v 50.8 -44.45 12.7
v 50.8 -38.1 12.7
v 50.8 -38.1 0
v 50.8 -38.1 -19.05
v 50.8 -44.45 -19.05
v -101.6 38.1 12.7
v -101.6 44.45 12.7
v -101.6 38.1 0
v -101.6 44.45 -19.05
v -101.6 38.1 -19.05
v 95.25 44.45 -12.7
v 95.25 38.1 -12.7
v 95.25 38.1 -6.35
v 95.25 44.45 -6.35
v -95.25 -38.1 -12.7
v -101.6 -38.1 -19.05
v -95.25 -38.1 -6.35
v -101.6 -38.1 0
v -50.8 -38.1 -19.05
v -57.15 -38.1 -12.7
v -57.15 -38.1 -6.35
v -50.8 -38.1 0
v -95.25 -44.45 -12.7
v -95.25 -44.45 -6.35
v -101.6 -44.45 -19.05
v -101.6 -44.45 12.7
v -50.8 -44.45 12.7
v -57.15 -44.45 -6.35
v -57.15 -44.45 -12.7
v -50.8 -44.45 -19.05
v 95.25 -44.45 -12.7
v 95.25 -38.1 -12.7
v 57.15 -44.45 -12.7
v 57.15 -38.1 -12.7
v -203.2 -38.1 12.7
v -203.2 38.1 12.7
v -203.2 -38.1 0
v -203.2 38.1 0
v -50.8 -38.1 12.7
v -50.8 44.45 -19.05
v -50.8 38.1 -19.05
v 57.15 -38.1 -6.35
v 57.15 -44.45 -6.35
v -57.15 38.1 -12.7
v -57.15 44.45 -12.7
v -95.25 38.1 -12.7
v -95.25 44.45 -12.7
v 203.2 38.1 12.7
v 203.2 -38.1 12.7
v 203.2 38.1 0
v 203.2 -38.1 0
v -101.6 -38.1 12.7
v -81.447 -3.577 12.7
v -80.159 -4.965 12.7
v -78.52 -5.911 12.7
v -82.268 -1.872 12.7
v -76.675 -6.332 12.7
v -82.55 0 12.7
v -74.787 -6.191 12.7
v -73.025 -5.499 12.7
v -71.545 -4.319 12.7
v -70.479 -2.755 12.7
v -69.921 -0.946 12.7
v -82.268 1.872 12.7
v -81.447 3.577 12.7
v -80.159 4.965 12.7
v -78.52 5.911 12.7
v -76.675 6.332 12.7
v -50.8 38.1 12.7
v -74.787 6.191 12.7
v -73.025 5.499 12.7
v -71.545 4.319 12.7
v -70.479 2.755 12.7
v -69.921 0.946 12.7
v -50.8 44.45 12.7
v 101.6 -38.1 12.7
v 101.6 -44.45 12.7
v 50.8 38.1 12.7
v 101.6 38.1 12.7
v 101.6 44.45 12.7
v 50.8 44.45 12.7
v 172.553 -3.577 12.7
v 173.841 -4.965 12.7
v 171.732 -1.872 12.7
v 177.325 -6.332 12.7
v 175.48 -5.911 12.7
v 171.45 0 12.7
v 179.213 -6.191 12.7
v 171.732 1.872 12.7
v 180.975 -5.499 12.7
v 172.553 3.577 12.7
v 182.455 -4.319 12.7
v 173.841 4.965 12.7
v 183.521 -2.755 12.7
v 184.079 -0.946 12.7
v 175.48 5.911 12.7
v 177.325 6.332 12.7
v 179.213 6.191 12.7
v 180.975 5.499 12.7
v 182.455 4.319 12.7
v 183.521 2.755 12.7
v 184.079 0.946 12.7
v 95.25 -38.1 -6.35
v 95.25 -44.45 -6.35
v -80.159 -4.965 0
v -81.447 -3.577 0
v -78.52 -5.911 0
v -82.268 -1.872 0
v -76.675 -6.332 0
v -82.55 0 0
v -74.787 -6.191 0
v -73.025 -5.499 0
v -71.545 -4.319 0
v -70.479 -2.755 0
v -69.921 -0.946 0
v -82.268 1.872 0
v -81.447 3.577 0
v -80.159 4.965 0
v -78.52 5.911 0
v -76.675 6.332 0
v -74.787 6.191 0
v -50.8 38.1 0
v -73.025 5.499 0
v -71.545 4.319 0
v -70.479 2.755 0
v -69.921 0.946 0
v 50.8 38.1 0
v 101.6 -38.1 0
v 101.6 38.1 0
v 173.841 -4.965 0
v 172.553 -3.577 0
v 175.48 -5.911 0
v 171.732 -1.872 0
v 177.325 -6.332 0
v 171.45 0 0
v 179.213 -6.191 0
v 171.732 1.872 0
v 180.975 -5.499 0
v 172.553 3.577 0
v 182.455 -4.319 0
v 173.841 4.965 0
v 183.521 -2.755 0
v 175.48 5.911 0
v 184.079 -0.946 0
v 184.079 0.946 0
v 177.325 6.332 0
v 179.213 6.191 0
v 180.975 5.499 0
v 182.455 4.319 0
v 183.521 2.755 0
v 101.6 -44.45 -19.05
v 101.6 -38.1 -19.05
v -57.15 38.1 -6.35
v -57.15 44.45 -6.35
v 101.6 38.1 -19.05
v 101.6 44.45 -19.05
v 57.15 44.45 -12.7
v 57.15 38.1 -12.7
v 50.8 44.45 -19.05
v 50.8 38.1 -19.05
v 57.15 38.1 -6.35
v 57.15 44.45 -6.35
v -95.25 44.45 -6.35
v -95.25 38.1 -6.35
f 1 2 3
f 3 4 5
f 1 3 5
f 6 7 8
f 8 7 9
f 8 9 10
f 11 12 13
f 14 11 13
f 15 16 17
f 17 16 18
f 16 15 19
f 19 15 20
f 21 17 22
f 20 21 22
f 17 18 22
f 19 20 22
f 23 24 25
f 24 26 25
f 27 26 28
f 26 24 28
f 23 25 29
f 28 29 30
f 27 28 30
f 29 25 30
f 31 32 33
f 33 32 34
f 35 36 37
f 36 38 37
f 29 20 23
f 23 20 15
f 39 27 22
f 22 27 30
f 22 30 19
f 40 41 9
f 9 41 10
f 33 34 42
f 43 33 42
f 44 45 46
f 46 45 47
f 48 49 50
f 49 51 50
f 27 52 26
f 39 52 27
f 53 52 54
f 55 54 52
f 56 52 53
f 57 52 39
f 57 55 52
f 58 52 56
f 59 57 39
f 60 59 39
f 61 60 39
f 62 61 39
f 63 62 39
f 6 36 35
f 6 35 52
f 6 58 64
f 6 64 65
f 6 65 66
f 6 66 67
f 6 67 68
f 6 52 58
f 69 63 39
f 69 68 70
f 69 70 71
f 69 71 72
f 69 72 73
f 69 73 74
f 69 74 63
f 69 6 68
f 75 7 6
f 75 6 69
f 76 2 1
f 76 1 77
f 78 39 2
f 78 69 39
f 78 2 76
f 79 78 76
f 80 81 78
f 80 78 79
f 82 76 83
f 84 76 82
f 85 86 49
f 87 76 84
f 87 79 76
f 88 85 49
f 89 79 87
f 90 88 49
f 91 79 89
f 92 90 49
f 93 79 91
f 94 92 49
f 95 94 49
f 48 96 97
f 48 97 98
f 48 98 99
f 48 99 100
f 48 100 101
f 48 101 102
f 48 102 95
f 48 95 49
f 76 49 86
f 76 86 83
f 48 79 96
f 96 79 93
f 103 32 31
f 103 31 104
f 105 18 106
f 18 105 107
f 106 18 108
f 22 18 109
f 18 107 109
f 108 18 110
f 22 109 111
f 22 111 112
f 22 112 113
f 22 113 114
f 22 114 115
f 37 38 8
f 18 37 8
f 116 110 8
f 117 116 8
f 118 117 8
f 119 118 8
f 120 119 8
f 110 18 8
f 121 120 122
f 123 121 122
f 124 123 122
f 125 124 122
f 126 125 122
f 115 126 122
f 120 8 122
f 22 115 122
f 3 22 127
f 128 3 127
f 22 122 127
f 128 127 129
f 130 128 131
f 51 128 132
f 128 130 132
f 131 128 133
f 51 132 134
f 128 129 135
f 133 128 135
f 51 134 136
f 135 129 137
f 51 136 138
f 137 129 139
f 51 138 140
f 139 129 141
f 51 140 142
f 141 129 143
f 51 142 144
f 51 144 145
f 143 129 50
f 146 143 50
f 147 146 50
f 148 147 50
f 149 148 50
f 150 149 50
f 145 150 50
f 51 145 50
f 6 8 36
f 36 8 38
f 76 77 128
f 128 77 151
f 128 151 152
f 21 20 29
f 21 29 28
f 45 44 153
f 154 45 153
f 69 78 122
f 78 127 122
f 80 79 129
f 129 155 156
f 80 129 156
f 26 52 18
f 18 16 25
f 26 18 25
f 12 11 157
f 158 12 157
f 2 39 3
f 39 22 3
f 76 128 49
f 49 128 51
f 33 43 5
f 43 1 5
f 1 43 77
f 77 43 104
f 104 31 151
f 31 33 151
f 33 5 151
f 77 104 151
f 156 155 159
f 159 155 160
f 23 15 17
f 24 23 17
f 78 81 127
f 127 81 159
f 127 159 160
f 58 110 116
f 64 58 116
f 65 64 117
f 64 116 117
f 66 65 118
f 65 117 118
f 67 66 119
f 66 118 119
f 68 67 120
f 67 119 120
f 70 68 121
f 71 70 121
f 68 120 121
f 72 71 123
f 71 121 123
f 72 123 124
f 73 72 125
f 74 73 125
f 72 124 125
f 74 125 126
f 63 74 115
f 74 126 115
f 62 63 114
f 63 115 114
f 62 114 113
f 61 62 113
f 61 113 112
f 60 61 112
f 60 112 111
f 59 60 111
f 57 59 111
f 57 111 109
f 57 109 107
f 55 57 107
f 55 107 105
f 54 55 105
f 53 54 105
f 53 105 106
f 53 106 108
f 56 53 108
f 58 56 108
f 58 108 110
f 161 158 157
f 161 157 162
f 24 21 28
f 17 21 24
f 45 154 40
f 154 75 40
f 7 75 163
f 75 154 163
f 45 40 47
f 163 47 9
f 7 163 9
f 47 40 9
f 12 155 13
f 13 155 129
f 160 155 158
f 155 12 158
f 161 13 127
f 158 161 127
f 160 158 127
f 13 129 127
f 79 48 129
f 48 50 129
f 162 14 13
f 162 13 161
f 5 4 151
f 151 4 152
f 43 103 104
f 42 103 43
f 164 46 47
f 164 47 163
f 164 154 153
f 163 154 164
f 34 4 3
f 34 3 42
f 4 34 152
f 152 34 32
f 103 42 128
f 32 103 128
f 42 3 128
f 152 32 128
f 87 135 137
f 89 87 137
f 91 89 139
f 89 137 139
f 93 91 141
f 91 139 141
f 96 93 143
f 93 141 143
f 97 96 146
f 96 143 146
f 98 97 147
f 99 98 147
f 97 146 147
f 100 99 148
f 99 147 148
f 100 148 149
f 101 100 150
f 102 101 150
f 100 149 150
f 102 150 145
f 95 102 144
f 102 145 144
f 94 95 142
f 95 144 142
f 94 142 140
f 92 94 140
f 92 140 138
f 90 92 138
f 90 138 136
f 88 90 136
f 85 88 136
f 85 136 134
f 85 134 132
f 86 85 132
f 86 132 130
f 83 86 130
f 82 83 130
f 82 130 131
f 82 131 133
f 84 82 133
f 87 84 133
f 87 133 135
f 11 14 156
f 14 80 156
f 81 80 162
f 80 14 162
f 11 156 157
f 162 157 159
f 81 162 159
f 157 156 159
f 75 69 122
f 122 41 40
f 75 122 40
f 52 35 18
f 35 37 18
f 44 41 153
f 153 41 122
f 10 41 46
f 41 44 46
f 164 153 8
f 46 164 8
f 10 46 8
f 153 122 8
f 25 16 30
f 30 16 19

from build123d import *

# Parameters (mm, degrees)
F0_W      = 406.4
F0_H      = 76.2
F1_DEPTH  = 6.35
F2_W      = 50.8
F2_H      = 25.4
F3_DEPTH  = 6.35
F4_W      = 50.8
F4_H      = 25.4
F5_DEPTH  = 6.35
F7_W      = 38.1
F7_H      = 6.35
F6_W      = 38.1
F6_H      = 6.35
F8_DEPTH  = 88.901
F10_DEPTH = 6.35
F12_D     = 12.7


with BuildPart() as f1:
    # F0 (on Top) → F1 (new body)
    with BuildSketch(Plane.XY):
        Rectangle(F0_W, F0_H)
    extrude(amount=F1_DEPTH)

    # F2 (on face) → F3 (join)
    with BuildSketch(Plane.XZ.offset(38.1)):
        with Locations((76.2, -6.35)):
            Rectangle(F2_W, F2_H)
        with Locations((-76.2, -6.35)):
            Rectangle(F2_W, F2_H)
    extrude(amount=F3_DEPTH)

    # F4 (on face) → F5 (join)
    with BuildSketch(Plane(origin=(0, 38.1, 0), x_dir=(-1, 0, 0), z_dir=(0, 1, 0))):
        with Locations((-76.2, -6.35)):
            Rectangle(F4_W, F4_H)
        with Locations((76.2, -6.35)):
            Rectangle(F4_W, F4_H)
    extrude(amount=F5_DEPTH)

    # F7 (on face) + F6 (on face) → F8 (cut, through all)
    with BuildSketch(Plane(origin=(0, 44.45, 0), x_dir=(-1, 0, 0), z_dir=(0, 1, 0))):
        with Locations((76.2, -9.525)):
            Rectangle(F7_W, F7_H)
    with BuildSketch(Plane(origin=(0, 44.45, 0), x_dir=(-1, 0, 0), z_dir=(0, 1, 0))):
        with Locations((-76.2, -9.525)):
            Rectangle(F6_W, F6_H)
    extrude(amount=-F8_DEPTH, mode=Mode.SUBTRACT)

    # F9 (on face) → F10 (join)
    with BuildSketch(Plane.XY.offset(6.35)):
        Polygon((-101.6, 38.1), (-203.2, 38.1), (-203.2, -38.1), (-101.6, -38.1), (-101.6, -44.45), (-50.8, -44.45), (-50.8, -38.1), (50.8, -38.1), (50.8, -44.45), (101.6, -44.45), (101.6, -38.1), (203.2, -38.1), (203.2, 38.1), (101.6, 38.1), (101.6, 44.45), (50.8, 44.45), (50.8, 38.1), (-50.8, 38.1), (-50.8, 44.45), (-101.6, 44.45), align=None)
    extrude(amount=F10_DEPTH)

    # F12 (through all)
    with Locations(Plane.XY.offset(12.7)):
        with Locations((177.8, 0), (-76.2, 0)):
            Hole(F12_D / 2)


solid = f1.part
